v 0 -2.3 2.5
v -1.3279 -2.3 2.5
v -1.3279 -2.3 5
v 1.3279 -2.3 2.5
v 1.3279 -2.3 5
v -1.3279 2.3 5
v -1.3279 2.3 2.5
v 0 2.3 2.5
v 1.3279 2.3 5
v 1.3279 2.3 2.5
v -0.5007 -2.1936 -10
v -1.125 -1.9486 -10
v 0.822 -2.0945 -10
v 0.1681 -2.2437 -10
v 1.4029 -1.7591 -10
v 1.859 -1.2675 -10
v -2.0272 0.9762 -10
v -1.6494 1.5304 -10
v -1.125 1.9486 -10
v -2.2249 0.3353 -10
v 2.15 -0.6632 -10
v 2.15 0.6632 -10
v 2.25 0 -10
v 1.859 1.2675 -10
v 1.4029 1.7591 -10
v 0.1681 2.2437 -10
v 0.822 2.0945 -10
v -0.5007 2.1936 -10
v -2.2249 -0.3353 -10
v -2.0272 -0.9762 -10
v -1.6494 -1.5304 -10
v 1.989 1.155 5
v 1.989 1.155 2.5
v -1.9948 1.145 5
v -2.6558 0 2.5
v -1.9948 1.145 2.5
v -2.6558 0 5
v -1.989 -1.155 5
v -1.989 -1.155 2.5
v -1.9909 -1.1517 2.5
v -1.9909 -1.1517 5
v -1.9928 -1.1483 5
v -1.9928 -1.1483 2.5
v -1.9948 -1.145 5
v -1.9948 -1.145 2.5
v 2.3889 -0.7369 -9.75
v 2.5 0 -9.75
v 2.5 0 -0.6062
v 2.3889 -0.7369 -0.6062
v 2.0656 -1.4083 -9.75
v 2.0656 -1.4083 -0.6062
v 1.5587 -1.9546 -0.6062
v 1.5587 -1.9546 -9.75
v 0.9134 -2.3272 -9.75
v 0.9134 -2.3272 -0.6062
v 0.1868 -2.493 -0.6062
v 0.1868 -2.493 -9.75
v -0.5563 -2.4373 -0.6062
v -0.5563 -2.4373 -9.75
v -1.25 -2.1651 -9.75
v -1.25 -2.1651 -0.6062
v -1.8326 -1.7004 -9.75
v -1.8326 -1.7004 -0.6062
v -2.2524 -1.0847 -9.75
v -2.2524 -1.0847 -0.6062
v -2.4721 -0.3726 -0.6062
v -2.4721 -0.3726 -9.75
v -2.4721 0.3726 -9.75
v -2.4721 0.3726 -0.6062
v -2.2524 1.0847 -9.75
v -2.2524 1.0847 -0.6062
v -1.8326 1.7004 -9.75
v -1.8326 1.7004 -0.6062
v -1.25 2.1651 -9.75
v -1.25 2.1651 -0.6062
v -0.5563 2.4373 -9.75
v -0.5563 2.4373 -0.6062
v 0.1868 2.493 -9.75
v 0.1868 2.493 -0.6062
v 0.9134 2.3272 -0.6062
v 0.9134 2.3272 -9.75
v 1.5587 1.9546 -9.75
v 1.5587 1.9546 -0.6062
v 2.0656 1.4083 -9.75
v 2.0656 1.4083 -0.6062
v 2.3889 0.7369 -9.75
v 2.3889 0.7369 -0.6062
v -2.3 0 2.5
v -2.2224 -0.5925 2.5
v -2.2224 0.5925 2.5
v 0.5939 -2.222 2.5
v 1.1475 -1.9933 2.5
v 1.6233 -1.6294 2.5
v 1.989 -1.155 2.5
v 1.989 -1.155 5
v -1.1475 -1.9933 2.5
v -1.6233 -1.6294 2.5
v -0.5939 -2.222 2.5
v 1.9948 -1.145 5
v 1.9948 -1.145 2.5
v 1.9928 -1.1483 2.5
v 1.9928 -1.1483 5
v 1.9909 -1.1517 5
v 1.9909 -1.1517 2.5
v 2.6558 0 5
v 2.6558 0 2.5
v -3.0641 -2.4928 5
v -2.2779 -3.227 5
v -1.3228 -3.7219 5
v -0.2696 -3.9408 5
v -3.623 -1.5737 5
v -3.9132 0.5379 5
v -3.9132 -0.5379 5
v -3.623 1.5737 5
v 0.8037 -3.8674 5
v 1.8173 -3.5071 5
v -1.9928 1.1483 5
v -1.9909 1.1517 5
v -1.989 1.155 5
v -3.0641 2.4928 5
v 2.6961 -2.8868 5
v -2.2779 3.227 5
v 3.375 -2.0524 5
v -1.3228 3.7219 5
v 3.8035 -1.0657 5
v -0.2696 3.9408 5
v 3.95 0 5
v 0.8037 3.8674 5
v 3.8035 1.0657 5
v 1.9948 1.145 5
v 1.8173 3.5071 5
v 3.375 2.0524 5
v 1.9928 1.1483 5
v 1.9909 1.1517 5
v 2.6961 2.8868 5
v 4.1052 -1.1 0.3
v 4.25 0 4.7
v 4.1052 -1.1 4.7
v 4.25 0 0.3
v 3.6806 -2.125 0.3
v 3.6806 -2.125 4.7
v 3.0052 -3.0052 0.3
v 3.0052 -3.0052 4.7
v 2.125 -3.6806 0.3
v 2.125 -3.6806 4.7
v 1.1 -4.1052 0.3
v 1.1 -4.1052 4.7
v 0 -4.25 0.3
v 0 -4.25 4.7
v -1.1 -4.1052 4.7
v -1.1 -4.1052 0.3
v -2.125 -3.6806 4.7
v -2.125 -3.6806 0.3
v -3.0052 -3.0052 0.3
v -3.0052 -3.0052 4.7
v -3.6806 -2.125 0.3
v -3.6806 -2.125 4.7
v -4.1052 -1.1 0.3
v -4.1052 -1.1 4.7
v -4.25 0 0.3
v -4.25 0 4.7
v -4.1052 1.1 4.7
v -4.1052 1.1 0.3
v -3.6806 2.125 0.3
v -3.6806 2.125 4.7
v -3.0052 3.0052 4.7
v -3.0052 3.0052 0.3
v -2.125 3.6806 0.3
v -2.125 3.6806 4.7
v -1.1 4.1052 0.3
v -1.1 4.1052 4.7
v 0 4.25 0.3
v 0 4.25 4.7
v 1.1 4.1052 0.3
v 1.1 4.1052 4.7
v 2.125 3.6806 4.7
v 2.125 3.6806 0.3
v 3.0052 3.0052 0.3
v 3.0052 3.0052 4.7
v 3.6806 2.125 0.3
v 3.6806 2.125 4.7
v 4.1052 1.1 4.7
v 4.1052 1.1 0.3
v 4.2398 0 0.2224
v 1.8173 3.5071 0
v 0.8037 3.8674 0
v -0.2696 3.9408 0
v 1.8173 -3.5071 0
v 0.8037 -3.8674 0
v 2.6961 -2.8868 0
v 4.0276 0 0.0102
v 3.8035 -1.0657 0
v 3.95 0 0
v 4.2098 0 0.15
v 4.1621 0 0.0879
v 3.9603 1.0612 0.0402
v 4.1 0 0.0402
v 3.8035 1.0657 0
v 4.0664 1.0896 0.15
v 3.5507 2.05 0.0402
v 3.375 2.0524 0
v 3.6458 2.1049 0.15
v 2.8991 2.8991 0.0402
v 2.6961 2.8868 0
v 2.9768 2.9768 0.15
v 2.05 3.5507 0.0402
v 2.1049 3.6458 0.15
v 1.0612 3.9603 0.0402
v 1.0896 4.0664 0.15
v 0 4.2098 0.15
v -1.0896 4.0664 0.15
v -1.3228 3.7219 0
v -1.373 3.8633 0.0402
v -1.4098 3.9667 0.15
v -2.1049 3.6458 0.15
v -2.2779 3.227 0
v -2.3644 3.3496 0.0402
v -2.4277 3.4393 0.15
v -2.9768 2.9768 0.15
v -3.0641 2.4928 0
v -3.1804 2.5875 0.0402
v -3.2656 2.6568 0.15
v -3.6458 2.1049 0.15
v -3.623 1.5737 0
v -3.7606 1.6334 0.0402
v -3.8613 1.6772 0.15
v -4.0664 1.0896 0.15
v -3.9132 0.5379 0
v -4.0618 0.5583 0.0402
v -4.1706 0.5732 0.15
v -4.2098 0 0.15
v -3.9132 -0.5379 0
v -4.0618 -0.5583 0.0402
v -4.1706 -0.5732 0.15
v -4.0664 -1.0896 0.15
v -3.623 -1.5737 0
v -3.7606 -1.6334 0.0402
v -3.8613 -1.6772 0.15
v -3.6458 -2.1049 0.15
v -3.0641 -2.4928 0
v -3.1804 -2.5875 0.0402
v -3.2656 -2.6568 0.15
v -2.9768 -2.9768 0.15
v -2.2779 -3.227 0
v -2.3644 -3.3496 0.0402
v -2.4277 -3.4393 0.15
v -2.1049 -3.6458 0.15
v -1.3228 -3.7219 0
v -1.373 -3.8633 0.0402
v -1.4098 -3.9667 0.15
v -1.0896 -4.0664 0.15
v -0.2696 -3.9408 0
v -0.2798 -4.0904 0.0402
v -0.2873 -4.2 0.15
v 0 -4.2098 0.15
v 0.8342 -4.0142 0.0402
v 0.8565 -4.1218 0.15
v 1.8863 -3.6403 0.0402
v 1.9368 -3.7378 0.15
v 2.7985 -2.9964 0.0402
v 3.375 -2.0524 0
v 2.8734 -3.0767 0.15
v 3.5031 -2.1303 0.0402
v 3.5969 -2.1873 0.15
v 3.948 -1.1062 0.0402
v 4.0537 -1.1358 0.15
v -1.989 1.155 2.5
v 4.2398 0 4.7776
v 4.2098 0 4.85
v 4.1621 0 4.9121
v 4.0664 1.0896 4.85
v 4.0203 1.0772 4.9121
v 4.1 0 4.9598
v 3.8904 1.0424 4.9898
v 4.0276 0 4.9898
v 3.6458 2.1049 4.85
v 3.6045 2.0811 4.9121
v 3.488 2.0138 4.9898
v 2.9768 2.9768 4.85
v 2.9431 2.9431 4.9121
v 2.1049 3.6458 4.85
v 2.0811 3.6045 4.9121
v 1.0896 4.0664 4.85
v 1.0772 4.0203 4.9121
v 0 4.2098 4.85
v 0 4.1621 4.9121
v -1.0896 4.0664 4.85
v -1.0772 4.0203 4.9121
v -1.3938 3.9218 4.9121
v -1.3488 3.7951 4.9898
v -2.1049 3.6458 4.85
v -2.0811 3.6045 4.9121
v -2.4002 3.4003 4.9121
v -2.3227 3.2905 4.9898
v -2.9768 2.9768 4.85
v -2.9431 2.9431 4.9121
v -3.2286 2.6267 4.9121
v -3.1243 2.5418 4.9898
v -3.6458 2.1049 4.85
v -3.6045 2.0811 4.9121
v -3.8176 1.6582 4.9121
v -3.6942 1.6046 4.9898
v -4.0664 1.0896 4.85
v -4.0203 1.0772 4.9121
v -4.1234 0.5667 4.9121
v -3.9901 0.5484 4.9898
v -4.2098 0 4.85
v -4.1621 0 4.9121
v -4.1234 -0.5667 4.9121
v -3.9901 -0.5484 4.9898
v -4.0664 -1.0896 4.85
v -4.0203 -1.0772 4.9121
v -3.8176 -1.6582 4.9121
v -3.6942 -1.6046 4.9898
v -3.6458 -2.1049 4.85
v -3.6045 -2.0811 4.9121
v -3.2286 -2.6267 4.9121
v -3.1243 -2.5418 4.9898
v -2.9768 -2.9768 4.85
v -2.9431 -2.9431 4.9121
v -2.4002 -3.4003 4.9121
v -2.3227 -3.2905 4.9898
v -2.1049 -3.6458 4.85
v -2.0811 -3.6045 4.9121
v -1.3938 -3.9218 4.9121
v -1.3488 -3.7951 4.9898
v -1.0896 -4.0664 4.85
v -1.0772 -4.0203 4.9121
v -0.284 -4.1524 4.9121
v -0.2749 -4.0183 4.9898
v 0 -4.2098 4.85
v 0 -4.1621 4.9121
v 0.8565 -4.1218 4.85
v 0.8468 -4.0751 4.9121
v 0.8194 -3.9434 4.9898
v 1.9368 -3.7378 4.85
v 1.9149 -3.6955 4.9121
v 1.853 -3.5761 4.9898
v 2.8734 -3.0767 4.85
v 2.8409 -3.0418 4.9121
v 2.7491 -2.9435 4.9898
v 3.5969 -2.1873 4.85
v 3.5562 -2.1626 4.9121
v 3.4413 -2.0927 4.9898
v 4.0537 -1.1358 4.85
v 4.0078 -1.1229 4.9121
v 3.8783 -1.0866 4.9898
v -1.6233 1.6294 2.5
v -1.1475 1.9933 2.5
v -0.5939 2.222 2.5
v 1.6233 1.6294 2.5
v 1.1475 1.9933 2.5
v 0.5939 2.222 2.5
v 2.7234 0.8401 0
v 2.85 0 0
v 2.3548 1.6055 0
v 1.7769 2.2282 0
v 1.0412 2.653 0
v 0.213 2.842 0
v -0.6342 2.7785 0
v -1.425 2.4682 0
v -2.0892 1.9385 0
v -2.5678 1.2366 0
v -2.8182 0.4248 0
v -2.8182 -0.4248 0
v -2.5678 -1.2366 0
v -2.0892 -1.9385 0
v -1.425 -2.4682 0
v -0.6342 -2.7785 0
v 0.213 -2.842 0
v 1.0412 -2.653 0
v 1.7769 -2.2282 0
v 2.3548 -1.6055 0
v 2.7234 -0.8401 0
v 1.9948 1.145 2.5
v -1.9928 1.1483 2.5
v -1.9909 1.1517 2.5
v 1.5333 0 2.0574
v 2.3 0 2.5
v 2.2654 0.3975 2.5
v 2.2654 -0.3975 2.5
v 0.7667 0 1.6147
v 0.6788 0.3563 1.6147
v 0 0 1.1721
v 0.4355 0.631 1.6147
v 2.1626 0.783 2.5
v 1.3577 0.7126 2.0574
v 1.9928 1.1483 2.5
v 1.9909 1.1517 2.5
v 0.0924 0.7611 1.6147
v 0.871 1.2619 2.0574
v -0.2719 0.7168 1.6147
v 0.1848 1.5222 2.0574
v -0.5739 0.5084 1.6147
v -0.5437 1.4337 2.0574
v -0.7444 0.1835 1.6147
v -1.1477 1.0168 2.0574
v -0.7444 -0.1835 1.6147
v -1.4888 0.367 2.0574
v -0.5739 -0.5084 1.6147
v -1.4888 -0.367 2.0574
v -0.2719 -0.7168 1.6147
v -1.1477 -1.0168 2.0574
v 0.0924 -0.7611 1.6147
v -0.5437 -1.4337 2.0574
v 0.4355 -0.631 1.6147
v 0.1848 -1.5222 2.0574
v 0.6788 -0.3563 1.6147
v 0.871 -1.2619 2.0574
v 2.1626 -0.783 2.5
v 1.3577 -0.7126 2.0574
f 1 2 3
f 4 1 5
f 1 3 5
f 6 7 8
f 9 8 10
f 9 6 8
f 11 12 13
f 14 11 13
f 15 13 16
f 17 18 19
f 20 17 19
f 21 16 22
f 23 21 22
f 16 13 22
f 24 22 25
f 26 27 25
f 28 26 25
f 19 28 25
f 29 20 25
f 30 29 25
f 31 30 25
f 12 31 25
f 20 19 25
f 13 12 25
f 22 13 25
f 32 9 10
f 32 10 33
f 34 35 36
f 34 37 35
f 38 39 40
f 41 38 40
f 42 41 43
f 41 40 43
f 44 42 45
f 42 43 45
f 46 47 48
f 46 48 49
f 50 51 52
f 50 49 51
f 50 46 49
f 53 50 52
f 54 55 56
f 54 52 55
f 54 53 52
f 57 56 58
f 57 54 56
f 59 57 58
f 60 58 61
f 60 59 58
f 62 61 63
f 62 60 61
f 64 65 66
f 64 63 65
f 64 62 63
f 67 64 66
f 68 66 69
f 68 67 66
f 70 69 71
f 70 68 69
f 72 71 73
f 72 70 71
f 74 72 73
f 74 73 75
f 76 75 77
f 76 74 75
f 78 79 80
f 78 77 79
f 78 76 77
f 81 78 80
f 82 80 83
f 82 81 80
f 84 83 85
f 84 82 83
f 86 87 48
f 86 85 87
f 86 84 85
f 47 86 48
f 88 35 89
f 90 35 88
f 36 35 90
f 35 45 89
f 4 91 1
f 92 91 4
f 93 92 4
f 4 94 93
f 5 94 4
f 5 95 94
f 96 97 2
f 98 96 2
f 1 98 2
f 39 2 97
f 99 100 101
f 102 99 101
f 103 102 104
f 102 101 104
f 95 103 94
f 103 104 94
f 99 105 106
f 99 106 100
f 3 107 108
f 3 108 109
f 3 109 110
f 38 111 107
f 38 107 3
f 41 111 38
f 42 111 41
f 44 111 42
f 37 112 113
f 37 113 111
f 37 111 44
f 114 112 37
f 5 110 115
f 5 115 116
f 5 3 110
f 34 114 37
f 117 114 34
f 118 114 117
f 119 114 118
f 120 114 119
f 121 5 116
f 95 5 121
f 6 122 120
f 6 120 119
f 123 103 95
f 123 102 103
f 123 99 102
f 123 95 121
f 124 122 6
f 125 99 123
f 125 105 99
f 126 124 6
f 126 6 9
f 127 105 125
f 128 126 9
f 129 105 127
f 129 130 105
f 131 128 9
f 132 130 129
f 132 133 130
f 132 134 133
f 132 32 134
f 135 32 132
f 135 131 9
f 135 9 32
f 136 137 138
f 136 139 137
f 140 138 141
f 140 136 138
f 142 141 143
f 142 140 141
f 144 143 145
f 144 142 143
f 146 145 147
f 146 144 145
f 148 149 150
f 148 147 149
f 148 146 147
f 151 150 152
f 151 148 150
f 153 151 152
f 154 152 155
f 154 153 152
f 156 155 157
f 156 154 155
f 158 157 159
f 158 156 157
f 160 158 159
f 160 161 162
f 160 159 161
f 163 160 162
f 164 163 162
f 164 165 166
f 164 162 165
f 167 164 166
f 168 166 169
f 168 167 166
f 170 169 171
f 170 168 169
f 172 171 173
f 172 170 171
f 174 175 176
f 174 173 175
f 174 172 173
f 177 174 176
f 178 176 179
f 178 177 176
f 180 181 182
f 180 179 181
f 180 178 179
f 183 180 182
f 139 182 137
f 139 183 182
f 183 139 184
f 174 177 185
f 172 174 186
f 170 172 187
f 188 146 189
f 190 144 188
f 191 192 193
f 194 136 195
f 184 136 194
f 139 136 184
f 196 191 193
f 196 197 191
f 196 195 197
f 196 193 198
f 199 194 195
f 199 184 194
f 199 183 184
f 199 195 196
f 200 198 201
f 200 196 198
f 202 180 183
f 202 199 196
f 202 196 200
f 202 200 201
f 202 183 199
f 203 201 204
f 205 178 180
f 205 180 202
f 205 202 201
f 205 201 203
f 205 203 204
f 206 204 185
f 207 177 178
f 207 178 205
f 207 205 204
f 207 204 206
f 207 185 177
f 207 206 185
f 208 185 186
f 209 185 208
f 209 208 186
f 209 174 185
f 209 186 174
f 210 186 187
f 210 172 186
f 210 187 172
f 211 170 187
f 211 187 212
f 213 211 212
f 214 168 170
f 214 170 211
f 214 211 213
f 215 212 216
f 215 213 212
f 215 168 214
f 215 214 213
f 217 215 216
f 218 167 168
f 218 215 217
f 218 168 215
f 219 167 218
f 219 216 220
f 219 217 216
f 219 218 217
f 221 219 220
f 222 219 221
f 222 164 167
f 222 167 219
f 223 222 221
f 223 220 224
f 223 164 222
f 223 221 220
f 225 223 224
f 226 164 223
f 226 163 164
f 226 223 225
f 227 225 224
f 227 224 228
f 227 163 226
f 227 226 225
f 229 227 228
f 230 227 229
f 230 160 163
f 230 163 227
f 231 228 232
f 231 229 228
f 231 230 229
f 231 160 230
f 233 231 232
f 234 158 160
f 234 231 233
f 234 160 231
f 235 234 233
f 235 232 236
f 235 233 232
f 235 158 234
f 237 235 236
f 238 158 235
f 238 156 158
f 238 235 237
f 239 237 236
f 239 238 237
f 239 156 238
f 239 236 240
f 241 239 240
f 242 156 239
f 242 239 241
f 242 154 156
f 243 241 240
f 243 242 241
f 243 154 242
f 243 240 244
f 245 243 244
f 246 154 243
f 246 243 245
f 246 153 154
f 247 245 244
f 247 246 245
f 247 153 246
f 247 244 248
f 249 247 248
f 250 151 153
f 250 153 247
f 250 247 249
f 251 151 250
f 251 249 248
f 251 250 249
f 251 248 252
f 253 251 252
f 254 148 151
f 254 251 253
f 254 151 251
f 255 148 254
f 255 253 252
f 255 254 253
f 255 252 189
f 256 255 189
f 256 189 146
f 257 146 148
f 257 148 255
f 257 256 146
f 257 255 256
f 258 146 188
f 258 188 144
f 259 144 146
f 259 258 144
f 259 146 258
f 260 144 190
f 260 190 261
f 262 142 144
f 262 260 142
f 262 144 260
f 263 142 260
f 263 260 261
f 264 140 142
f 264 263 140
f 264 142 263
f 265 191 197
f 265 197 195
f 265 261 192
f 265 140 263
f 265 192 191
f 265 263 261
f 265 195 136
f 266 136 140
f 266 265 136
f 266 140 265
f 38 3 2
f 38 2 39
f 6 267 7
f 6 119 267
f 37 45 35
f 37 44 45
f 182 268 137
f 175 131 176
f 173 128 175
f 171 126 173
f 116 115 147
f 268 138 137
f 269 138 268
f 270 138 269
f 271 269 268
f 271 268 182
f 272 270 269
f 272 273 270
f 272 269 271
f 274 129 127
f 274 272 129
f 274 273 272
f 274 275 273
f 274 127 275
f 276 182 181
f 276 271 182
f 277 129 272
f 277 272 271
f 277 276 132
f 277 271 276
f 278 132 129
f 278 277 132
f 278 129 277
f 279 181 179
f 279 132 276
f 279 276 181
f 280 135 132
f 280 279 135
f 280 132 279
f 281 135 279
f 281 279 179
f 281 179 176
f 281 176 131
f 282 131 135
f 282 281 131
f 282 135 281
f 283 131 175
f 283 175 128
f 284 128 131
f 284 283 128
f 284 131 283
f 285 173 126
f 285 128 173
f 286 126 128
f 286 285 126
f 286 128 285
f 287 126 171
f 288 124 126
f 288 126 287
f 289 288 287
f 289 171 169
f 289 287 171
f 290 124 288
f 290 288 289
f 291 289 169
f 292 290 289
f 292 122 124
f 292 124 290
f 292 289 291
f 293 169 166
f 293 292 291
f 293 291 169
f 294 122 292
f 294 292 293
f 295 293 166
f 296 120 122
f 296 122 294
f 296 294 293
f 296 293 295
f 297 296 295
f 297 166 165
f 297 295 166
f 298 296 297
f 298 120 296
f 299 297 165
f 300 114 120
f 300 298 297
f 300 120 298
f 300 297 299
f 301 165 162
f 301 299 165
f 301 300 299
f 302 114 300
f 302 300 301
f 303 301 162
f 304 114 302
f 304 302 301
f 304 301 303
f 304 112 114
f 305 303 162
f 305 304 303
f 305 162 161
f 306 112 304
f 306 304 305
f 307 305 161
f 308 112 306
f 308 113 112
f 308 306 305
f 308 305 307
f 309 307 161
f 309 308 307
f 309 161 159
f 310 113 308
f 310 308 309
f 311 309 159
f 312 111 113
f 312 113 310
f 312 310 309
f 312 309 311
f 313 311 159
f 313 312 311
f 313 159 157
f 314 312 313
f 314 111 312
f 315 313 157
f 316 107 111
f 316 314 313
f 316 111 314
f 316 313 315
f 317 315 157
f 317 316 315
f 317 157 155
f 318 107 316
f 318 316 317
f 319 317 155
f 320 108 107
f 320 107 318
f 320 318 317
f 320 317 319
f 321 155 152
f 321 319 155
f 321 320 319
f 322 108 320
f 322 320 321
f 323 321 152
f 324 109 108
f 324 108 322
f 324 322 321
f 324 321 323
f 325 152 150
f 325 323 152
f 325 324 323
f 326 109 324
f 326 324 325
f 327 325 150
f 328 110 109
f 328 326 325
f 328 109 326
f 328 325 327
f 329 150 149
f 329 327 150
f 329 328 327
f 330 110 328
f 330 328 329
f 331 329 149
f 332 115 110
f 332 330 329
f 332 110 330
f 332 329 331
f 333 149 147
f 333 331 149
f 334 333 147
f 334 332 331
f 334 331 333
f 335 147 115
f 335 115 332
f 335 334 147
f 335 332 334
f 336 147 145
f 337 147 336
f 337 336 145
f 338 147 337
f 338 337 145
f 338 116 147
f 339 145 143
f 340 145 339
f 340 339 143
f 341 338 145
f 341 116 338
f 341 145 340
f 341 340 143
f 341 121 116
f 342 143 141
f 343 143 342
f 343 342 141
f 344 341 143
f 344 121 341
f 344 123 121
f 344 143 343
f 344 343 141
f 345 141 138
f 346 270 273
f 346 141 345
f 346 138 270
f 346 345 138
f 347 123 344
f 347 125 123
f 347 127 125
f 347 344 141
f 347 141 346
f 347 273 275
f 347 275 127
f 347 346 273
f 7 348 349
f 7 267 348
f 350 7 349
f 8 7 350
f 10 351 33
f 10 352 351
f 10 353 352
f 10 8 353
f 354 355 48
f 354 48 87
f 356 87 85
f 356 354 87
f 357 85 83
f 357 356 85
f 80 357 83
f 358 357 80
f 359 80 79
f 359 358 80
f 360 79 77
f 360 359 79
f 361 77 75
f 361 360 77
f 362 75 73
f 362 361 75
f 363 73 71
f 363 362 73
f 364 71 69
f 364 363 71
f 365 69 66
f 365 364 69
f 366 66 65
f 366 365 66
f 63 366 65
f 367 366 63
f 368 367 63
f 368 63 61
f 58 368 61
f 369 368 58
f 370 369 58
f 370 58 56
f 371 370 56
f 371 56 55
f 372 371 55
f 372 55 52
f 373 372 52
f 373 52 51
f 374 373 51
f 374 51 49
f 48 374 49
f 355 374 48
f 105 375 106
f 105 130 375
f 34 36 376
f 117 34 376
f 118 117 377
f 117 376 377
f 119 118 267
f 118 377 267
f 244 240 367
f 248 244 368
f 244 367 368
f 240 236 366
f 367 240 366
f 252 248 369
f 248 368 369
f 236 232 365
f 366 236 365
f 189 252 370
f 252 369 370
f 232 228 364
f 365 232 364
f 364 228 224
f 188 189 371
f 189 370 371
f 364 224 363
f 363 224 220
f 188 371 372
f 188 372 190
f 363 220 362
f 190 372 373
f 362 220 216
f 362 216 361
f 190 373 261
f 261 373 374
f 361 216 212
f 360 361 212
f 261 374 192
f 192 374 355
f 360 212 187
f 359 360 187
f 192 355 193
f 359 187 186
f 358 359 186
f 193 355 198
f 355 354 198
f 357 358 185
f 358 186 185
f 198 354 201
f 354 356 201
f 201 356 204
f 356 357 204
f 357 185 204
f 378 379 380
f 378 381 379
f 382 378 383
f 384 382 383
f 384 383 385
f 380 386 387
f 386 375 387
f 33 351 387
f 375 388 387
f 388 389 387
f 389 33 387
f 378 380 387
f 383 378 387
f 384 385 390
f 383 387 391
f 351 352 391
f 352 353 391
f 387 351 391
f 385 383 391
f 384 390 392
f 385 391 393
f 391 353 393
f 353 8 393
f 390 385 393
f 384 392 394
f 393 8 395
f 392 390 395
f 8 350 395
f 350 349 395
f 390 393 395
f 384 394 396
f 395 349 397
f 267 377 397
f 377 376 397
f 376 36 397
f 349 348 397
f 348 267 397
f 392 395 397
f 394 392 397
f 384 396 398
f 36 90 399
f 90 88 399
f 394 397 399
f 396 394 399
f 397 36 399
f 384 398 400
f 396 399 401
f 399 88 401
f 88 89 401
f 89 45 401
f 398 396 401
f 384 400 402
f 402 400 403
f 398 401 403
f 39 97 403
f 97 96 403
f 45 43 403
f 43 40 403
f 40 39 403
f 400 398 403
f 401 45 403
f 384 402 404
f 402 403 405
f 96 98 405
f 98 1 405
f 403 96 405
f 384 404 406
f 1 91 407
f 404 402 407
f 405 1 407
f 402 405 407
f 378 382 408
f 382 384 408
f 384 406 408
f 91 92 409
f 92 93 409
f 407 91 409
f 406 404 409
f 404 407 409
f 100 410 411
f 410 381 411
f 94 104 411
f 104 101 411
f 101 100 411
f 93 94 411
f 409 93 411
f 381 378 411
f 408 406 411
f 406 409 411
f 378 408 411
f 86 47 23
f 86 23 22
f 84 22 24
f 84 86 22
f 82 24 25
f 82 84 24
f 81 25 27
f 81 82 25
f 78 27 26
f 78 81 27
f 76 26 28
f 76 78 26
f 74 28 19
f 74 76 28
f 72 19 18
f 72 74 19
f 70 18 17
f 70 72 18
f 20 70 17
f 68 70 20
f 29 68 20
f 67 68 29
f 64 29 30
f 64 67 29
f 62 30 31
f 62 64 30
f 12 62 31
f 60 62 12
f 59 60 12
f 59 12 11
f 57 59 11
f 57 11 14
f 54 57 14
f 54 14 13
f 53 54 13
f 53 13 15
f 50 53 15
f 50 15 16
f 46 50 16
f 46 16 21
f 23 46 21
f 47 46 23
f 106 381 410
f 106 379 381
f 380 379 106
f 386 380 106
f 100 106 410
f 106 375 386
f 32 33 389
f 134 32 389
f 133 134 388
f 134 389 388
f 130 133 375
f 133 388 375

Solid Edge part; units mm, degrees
sketch "Sketch1" plane through (0, 0, 0) normal (0, -1, 0) x (1, 0, 0)
  line L0 (4.25, 5) -> (4.25, 0)
  line L1 (4.25, 0) -> (2.85, 0)
  line L2 (2.85, 0) -> (2.5, -0.6062)
  line L3 (2.5, -0.6062) -> (2.5, -10)
  line L4 (2.5, -10) -> (0, -10)
  line L5 (2.3, 2.5) -> (0, 1.1721)
  line L6 (2.3, 5) -> (2.3, 2.5)
  line L7 (4.25, 5) -> (2.3, 5)
  dimension "D1" = 2.5
  dimension "D2" = 10
  dimension "D3" = 5
revolve "RevolvedProtrusion1" add sketch "Sketch1" angle 360 about axis through (0, 0, -6) along (0, 0, 1)
cosmetic_thread "Thread1" size "M5"
chamfer "chamfer" distance 0.25 angle 45 1 edges at (-2.5, 0, -10)
fillet "head_roundings" radius 0.3 2 edges at (-4.25, 0, 0) (-4.25, 0, 5)
sketch "Sketch2" plane through (0, 0, 5) normal (0, 0, 1) x (0, 1, 0)
  line L0 (-2.3, 1.3279) -> (-2.3, -1.3279)
  line L1 (0, -2.6558) -> (-2.3, -1.3279)
  line L2 (2.3, -1.3279) -> (0, -2.6558)
  line L3 (2.3, 1.3279) -> (2.3, -1.3279)
  line L4 (0, 2.6558) -> (2.3, 1.3279)
  line L5 (-2.3, 1.3279) -> (0, 2.6558)
extrude "Cutout1" cut sketch "Sketch2" against normal up to vertex (2.5 mm away)
properties part number "STD-DIN912-M5x10" material "Galvanized steel"
